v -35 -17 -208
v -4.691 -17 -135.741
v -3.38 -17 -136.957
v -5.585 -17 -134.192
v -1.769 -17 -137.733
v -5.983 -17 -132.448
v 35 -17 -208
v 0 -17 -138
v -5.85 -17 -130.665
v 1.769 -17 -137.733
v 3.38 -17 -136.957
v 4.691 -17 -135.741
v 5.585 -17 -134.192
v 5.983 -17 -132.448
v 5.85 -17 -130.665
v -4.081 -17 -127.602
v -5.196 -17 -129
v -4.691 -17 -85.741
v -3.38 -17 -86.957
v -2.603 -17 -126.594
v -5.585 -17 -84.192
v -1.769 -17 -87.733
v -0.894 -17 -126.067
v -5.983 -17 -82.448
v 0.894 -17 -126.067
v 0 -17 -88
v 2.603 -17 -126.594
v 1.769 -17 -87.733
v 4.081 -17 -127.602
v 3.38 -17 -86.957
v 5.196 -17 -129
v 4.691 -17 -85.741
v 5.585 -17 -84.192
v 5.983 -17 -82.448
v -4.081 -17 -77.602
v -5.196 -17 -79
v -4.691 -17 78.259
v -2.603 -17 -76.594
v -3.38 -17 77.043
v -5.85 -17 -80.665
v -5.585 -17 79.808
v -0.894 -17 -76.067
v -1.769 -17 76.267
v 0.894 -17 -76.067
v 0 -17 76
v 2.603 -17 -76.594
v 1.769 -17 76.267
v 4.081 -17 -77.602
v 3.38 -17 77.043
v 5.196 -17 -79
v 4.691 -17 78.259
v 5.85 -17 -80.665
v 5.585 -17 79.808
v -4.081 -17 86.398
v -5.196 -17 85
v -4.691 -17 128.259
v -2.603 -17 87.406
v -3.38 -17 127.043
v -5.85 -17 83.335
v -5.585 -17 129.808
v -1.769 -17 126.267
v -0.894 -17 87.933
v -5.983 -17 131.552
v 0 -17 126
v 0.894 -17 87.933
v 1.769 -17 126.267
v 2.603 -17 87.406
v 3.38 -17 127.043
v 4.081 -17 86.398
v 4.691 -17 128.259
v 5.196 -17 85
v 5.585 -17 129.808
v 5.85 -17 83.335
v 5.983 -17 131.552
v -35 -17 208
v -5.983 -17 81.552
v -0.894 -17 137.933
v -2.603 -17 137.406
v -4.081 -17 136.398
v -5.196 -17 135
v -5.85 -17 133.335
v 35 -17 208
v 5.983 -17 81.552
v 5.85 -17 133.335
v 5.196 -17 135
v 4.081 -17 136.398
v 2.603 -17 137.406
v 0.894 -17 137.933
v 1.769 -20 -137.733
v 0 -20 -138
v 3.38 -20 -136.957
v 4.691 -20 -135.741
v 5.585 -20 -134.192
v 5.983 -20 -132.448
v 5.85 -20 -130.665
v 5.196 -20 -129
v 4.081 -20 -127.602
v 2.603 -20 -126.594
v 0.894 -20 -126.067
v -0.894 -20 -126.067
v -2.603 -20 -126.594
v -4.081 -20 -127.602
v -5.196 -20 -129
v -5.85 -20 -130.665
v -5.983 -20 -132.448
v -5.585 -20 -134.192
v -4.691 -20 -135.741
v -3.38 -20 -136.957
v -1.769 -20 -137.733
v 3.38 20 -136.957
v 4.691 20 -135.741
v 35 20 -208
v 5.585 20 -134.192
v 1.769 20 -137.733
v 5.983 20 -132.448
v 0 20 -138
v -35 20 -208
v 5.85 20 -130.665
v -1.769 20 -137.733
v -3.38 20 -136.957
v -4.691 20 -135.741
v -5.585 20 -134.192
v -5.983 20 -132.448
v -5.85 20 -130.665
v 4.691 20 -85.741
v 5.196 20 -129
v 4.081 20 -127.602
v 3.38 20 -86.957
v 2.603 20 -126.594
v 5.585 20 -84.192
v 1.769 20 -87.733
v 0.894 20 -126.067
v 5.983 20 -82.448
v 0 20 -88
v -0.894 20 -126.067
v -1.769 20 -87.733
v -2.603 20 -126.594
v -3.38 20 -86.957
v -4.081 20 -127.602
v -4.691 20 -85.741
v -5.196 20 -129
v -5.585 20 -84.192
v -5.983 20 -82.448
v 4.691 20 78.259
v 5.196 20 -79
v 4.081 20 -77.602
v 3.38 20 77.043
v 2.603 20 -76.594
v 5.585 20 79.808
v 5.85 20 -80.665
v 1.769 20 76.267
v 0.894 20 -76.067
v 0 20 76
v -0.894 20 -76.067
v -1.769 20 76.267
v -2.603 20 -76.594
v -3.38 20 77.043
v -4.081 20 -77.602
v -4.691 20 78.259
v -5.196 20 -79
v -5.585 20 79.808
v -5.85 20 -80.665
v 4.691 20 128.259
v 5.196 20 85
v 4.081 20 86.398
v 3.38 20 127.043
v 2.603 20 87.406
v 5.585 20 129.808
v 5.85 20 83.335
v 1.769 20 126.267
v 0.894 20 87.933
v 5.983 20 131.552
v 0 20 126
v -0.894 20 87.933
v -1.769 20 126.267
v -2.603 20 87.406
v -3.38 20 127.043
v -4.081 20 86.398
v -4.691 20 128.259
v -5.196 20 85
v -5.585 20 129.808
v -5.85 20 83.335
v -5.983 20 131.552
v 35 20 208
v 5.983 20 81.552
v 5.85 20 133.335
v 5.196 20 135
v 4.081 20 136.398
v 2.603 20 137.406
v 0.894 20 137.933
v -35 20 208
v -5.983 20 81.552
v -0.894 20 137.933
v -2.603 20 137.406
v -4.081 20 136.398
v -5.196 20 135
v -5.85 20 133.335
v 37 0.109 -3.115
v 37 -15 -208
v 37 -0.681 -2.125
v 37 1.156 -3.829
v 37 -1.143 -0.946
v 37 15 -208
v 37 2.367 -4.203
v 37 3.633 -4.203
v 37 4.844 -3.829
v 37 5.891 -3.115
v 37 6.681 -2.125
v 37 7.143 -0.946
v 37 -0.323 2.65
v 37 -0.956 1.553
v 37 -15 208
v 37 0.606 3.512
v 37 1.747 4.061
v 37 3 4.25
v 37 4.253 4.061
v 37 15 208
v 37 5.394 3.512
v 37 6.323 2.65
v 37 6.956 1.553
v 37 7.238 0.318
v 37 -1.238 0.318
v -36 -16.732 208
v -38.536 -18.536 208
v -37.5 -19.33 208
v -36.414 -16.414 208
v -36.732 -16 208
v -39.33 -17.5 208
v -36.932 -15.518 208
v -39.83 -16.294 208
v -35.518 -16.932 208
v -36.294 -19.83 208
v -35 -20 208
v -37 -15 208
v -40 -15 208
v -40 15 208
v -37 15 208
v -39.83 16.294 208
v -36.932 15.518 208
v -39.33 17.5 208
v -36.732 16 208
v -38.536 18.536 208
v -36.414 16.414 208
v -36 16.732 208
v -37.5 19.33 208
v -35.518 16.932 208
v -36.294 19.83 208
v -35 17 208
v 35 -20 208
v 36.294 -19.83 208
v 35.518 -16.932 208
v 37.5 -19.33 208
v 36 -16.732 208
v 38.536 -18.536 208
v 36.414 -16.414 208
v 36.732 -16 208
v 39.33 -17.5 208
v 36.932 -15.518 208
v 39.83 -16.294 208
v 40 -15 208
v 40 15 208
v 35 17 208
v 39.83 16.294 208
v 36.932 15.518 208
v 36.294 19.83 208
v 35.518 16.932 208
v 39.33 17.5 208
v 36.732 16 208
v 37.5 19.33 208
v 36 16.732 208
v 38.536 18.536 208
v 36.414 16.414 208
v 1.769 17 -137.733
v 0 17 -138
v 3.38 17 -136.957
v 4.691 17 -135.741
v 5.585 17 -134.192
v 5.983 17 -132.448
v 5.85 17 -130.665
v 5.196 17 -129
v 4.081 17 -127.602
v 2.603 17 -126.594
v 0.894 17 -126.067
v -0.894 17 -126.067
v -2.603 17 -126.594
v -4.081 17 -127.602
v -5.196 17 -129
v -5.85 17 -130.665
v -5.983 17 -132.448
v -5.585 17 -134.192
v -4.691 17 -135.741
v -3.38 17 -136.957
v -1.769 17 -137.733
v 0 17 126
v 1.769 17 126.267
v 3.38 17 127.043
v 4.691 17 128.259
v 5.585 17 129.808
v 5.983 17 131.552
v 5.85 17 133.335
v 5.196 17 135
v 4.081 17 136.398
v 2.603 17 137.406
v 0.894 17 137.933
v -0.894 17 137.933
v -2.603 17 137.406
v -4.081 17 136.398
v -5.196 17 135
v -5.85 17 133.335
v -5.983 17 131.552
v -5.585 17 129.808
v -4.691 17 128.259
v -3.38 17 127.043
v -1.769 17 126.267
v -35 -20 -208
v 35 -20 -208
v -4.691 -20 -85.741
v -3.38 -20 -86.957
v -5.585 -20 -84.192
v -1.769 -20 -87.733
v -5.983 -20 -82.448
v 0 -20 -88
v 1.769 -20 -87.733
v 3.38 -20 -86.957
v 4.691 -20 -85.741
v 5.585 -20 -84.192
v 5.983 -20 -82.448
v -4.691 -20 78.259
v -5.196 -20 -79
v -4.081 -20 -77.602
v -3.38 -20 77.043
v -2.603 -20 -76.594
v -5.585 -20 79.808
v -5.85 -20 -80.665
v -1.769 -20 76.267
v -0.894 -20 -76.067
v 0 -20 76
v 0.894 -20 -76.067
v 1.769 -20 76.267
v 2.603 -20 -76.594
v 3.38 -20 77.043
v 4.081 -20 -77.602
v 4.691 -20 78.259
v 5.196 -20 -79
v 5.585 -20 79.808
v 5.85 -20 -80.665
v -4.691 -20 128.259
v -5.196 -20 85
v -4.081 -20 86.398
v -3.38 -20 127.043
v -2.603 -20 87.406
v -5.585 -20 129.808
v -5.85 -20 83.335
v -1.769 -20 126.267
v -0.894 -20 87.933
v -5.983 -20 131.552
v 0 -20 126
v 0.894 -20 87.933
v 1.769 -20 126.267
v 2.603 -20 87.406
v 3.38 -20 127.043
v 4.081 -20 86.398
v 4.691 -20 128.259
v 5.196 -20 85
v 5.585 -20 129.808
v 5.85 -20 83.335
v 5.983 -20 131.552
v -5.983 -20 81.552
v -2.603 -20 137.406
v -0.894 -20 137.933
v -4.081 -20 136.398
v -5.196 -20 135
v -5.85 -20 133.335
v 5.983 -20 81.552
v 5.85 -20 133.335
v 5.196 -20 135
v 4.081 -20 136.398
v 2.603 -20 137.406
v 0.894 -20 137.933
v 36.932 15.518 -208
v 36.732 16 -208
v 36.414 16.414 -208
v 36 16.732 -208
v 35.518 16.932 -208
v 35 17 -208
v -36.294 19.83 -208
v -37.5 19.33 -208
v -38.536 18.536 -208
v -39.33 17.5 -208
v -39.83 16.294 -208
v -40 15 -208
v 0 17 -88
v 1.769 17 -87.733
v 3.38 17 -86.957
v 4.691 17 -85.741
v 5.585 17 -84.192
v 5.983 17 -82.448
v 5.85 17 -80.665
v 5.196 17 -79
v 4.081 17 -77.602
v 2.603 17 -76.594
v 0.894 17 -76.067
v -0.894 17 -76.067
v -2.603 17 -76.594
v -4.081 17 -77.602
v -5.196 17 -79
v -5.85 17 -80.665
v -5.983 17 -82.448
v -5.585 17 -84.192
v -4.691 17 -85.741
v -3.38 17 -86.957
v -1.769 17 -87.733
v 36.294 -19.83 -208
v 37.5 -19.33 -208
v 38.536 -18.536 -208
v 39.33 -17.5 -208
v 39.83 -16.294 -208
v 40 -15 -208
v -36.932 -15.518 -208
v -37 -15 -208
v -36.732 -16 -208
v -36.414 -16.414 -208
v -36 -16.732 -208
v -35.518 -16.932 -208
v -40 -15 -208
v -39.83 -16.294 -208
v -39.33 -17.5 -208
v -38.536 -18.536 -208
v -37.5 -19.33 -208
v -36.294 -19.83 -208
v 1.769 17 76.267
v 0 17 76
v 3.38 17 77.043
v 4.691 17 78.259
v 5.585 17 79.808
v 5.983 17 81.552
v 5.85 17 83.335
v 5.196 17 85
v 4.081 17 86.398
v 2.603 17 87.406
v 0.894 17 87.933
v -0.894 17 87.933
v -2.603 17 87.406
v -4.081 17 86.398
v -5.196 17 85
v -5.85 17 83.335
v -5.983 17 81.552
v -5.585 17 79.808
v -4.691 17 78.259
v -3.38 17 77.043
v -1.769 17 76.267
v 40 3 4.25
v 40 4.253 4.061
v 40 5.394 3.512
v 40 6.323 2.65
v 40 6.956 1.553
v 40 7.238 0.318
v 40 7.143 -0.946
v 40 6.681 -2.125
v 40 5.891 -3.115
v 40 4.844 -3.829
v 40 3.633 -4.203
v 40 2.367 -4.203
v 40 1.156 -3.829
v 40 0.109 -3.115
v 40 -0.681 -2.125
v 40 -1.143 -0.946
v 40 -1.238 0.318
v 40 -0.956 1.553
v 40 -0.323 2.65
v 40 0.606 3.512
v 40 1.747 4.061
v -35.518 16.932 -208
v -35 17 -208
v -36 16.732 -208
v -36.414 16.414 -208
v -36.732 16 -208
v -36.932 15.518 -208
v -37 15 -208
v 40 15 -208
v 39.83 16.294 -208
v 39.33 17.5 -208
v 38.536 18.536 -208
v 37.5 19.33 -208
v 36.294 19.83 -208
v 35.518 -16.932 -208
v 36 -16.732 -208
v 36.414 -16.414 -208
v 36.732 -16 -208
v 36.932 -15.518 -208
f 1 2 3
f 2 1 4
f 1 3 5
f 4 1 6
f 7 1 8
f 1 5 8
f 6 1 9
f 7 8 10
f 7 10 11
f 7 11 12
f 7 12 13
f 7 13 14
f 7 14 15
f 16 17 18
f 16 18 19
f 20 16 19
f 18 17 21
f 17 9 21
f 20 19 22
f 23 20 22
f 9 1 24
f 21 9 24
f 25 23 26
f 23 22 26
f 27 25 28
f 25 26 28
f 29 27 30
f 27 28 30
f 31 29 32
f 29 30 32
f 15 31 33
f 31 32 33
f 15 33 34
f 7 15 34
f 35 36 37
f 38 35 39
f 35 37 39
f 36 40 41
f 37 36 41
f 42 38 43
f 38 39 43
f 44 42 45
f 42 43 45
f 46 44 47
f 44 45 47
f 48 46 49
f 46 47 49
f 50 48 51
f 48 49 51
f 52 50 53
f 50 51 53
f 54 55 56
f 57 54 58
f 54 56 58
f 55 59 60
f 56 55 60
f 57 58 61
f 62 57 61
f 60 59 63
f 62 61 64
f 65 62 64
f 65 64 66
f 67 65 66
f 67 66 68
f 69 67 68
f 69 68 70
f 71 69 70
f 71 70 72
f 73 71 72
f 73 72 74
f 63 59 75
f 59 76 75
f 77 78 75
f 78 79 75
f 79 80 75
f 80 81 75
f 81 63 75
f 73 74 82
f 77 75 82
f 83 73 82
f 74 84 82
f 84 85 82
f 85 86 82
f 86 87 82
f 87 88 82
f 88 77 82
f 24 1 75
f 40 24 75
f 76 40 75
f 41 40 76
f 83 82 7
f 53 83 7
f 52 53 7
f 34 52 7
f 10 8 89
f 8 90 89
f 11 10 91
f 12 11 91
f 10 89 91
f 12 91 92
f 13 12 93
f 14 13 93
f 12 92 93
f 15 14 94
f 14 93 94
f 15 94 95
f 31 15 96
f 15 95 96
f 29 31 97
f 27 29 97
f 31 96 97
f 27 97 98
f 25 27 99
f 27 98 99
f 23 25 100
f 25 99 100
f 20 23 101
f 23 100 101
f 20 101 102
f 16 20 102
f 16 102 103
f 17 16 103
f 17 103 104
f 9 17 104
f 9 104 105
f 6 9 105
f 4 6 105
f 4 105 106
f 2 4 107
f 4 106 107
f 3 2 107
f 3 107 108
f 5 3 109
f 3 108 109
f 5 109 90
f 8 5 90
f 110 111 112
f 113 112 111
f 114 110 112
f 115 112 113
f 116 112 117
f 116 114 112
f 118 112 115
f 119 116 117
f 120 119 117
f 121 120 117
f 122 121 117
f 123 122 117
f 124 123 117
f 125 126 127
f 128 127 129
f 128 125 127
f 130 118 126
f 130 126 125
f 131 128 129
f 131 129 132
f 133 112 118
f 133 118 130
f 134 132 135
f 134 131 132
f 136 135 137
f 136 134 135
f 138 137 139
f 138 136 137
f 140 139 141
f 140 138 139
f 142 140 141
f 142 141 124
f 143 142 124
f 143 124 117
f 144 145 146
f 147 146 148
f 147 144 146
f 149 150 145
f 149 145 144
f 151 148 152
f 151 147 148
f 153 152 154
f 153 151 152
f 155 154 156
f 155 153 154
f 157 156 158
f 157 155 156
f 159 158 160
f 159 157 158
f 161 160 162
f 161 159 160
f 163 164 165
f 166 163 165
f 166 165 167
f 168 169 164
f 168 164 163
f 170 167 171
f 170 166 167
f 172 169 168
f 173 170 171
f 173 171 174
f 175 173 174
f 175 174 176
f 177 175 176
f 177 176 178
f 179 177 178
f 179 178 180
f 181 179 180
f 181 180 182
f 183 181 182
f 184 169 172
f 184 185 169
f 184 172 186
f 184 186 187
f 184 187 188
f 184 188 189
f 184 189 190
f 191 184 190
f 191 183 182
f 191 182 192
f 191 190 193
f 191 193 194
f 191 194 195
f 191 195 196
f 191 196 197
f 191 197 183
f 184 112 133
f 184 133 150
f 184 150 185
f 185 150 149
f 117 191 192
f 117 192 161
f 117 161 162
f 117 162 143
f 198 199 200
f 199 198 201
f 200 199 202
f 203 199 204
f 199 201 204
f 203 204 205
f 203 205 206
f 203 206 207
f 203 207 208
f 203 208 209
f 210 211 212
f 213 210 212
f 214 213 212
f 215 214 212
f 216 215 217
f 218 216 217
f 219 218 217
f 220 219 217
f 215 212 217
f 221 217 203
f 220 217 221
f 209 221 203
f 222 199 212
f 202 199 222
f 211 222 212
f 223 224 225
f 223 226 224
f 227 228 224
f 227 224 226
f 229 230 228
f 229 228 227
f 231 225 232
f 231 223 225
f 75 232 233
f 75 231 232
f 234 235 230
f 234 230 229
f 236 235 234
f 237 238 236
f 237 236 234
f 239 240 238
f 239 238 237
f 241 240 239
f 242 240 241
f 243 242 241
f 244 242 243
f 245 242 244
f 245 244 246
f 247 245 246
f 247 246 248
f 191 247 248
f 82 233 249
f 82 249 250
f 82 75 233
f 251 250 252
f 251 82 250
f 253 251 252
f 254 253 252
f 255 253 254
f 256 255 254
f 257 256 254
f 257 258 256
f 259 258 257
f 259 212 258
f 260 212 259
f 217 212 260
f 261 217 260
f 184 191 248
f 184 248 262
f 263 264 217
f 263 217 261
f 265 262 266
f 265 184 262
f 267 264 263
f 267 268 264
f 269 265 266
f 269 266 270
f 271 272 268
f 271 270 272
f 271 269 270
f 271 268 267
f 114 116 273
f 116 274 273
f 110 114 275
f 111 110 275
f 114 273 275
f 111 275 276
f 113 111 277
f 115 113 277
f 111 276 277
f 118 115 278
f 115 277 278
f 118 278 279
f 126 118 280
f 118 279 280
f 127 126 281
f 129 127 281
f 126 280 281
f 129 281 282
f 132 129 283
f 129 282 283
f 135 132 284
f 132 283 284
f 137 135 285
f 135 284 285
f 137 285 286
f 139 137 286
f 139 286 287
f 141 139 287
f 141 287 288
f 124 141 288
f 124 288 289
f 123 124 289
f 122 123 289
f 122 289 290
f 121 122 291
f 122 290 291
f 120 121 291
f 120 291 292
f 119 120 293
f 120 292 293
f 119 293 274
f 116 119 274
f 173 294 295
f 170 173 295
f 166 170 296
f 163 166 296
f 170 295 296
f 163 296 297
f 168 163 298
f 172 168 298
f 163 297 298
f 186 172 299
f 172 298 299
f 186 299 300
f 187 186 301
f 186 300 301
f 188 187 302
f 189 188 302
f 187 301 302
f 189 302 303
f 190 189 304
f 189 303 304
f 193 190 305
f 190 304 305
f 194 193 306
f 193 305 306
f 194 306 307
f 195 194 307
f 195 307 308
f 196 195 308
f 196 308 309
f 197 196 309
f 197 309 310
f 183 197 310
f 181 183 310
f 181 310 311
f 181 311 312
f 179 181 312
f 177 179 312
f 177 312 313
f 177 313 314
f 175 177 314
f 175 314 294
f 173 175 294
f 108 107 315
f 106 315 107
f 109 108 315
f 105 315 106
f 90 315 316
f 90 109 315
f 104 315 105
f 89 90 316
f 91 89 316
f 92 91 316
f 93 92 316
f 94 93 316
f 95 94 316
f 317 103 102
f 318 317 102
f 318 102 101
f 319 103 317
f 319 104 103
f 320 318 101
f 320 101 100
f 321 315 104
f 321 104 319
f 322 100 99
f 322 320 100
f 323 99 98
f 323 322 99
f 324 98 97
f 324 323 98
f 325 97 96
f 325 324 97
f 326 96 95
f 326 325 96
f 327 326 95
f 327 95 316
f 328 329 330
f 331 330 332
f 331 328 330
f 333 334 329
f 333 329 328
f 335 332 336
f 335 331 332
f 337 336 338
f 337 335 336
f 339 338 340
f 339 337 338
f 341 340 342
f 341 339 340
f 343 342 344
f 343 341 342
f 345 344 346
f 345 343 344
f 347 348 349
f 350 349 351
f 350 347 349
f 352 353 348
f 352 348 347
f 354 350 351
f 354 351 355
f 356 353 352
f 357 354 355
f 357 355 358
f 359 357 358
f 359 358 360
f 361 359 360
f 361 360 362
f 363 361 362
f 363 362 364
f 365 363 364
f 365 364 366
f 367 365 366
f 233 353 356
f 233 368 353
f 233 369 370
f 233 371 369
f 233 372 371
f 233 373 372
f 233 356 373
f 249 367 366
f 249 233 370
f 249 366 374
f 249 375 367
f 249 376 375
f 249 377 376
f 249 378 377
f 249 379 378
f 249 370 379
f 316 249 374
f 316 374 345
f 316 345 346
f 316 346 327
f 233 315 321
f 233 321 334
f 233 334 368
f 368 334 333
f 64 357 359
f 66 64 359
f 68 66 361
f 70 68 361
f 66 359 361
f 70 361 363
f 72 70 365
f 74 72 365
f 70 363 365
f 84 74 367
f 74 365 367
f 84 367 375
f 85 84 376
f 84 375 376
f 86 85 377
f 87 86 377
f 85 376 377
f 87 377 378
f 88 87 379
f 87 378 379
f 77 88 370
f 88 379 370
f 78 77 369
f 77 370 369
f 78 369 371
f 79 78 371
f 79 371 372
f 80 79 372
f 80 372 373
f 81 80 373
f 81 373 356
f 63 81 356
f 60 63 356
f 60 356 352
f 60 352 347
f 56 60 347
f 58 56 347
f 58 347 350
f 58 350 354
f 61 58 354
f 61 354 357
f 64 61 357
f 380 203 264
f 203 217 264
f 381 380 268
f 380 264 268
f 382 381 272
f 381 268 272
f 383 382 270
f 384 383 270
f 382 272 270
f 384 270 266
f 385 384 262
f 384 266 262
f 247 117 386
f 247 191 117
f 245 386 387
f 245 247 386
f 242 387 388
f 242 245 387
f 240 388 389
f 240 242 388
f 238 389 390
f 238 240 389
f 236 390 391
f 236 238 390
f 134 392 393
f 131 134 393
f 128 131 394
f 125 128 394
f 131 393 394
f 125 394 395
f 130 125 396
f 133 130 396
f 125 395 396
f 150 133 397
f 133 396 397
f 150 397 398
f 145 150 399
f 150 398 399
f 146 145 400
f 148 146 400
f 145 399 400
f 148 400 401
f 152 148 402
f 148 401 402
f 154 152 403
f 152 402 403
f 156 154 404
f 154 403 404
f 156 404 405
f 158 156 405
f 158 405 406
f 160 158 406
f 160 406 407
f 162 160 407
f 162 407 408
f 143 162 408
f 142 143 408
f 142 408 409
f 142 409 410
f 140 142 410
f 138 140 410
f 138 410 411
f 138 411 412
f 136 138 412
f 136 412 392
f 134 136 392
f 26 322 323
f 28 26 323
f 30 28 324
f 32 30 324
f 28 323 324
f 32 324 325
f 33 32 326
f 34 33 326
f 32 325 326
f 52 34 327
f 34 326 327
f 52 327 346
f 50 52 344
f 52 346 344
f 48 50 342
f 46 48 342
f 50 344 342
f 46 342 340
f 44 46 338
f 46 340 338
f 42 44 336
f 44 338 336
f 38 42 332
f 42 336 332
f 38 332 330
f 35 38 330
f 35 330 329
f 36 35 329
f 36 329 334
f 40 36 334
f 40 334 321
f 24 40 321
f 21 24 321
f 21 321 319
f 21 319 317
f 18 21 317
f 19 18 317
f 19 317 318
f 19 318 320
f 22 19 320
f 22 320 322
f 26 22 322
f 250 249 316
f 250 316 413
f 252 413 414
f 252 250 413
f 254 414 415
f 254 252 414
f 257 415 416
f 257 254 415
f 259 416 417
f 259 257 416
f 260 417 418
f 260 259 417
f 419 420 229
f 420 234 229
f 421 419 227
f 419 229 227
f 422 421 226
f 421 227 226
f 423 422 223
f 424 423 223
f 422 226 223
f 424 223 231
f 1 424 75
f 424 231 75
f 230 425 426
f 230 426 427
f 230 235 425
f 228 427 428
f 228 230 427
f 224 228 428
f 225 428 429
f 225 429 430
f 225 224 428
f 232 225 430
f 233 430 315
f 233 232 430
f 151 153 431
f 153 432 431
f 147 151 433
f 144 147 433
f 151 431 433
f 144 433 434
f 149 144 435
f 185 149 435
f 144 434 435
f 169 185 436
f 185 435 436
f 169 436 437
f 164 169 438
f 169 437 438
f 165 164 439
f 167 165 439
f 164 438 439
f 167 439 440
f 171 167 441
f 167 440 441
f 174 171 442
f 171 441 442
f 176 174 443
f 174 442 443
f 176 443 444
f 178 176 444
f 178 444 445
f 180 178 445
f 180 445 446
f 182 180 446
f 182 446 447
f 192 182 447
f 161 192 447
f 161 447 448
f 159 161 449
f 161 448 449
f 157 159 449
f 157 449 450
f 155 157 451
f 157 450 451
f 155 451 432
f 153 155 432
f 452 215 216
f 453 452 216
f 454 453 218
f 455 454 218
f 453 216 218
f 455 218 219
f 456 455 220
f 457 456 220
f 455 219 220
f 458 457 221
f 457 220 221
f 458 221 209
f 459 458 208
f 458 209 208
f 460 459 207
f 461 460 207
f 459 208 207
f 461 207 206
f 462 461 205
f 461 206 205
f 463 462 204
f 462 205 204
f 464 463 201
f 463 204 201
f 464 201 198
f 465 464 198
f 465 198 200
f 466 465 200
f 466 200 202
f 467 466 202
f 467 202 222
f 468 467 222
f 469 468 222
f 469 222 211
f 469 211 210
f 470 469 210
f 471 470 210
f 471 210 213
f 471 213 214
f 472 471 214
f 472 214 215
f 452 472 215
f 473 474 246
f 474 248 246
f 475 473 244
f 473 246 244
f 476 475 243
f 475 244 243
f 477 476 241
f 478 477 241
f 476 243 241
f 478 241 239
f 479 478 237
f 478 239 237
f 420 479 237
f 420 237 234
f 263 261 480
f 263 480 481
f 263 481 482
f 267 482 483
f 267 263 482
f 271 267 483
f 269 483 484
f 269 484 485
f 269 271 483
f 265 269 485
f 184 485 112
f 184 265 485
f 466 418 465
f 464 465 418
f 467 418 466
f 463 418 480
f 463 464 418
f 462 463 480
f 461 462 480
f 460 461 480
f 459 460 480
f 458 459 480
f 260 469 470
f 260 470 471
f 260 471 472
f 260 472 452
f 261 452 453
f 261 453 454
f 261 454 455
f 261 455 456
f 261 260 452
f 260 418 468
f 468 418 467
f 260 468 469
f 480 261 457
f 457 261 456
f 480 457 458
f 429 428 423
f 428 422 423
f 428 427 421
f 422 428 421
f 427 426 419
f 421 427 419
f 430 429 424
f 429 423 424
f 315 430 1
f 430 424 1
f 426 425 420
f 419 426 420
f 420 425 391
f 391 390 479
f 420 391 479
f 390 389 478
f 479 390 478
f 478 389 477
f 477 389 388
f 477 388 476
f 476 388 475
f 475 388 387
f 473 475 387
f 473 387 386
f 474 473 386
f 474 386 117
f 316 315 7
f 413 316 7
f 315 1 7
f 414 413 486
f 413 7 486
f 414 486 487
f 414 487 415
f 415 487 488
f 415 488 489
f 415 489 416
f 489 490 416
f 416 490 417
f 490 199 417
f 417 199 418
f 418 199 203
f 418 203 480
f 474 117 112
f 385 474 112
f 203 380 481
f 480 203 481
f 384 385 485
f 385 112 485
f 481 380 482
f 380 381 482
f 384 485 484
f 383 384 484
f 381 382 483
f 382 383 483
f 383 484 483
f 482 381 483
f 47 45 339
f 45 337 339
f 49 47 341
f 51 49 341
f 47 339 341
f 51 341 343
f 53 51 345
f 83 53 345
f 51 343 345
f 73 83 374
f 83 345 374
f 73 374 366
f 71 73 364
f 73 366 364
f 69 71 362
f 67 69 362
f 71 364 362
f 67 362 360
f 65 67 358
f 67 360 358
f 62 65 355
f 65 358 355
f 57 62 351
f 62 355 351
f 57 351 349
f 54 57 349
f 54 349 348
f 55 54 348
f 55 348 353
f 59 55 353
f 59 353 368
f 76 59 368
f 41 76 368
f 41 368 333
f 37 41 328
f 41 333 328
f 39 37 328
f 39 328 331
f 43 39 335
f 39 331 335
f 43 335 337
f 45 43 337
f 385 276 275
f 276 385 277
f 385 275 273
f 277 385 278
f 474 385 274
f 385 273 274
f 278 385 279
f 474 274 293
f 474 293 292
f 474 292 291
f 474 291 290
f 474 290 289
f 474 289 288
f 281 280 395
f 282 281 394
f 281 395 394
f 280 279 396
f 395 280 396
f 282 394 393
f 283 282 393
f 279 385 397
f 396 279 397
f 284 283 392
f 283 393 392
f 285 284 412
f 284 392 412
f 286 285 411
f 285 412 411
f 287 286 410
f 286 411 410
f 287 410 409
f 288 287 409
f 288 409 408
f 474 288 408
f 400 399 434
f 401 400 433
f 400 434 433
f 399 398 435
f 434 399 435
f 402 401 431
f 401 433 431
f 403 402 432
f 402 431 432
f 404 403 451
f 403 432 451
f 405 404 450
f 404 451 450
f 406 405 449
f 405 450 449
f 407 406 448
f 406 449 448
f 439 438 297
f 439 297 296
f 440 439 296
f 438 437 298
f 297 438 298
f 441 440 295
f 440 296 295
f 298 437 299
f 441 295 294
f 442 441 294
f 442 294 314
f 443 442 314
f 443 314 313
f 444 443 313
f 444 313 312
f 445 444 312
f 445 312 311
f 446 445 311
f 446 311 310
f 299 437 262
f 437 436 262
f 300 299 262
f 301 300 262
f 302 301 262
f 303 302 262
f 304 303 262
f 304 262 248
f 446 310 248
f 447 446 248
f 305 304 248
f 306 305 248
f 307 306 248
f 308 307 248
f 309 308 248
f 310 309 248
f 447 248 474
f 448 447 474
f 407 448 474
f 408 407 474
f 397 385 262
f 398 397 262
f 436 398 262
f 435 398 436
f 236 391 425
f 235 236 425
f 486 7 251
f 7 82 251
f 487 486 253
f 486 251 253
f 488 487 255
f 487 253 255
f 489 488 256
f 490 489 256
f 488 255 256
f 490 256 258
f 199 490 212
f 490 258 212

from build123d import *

# Parameters (mm, degrees)
EXTRUDE_1_DEPTH        = 208
HOLE_WIZARD_M101_D     = 8.5
HOLE_WIZARD_M101_DEPTH = 27.5
HOLE_WIZARD_M101_TIP   = 2.553657631
SKETCH_6_R             = 6
CUT_EXTRUDE_2_DEPTH    = 216.555097365
PATTERN_LINEAR_1_COUNT = 2
PATTERN_LINEAR_1_PITCH = 214


with BuildPart() as part:
    # Эскиз1 → Бобышка-Вытянуть1 (new, symmetric)
    with BuildSketch(Plane.XY):
        with BuildLine():
            Line((-35, -20), (35, -20))
            ThreePointArc((35, -20), (38.535533906, -18.535533906), (40, -15))
            Line((40, -15), (40, 15))
            ThreePointArc((40, 15), (38.535533906, 18.535533906), (35, 20))
            Line((35, 20), (-35, 20))
            ThreePointArc((-35, 20), (-38.535533906, 18.535533906), (-40, 15))
            Line((-40, 15), (-40, -15))
            ThreePointArc((-40, -15), (-38.535533906, -18.535533906), (-35, -20))
        make_face()
        with BuildLine():
            Line((-35, -17), (35, -17))
            ThreePointArc((35, -17), (36.414213562, -16.414213562), (37, -15))
            Line((37, -15), (37, 15))
            ThreePointArc((37, 15), (36.414213562, 16.414213562), (35, 17))
            Line((35, 17), (-35, 17))
            ThreePointArc((-35, 17), (-36.414213562, 16.414213562), (-37, 15))
            Line((-37, 15), (-37, -15))
            ThreePointArc((-37, -15), (-36.414213562, -16.414213562), (-35, -17))
        make_face(mode=Mode.SUBTRACT)
    extrude(amount=EXTRUDE_1_DEPTH, both=True)

    # Отверстие обработанное метчиком M101
    with Locations(Plane(origin=(40, 0, 0), x_dir=(0, 0, -1), z_dir=(1, 0, 0))):
        with Locations((400, 3), (0, 3), (-400, 3)):
            Hole(HOLE_WIZARD_M101_D / 2, depth=HOLE_WIZARD_M101_DEPTH)
            with Locations((0, 0, -(HOLE_WIZARD_M101_DEPTH + HOLE_WIZARD_M101_TIP / 2))):  # 118° drill point
                Cone(0, HOLE_WIZARD_M101_D / 2, HOLE_WIZARD_M101_TIP, mode=Mode.SUBTRACT)

    # Эскиз6 → Вырез-Вытянуть2 (cut, symmetric)
    with BuildSketch(Plane.XZ.offset(20)):
        with Locations(Location((0, 132, 0), (0, 0, 270))):
            Circle(SKETCH_6_R)
        with Locations(Location((0, 82, 0), (0, 0, 270))):
            Circle(SKETCH_6_R)
    cut_extrude_2 = extrude(amount=CUT_EXTRUDE_2_DEPTH, both=True, mode=Mode.SUBTRACT)

    # Линейный массив1: Вырез-Вытянуть2 ×2
    with Locations(*[(0, 0, -i * PATTERN_LINEAR_1_PITCH) for i in range(1, PATTERN_LINEAR_1_COUNT)]):
        add(cut_extrude_2, mode=Mode.SUBTRACT)


solid = part.part
